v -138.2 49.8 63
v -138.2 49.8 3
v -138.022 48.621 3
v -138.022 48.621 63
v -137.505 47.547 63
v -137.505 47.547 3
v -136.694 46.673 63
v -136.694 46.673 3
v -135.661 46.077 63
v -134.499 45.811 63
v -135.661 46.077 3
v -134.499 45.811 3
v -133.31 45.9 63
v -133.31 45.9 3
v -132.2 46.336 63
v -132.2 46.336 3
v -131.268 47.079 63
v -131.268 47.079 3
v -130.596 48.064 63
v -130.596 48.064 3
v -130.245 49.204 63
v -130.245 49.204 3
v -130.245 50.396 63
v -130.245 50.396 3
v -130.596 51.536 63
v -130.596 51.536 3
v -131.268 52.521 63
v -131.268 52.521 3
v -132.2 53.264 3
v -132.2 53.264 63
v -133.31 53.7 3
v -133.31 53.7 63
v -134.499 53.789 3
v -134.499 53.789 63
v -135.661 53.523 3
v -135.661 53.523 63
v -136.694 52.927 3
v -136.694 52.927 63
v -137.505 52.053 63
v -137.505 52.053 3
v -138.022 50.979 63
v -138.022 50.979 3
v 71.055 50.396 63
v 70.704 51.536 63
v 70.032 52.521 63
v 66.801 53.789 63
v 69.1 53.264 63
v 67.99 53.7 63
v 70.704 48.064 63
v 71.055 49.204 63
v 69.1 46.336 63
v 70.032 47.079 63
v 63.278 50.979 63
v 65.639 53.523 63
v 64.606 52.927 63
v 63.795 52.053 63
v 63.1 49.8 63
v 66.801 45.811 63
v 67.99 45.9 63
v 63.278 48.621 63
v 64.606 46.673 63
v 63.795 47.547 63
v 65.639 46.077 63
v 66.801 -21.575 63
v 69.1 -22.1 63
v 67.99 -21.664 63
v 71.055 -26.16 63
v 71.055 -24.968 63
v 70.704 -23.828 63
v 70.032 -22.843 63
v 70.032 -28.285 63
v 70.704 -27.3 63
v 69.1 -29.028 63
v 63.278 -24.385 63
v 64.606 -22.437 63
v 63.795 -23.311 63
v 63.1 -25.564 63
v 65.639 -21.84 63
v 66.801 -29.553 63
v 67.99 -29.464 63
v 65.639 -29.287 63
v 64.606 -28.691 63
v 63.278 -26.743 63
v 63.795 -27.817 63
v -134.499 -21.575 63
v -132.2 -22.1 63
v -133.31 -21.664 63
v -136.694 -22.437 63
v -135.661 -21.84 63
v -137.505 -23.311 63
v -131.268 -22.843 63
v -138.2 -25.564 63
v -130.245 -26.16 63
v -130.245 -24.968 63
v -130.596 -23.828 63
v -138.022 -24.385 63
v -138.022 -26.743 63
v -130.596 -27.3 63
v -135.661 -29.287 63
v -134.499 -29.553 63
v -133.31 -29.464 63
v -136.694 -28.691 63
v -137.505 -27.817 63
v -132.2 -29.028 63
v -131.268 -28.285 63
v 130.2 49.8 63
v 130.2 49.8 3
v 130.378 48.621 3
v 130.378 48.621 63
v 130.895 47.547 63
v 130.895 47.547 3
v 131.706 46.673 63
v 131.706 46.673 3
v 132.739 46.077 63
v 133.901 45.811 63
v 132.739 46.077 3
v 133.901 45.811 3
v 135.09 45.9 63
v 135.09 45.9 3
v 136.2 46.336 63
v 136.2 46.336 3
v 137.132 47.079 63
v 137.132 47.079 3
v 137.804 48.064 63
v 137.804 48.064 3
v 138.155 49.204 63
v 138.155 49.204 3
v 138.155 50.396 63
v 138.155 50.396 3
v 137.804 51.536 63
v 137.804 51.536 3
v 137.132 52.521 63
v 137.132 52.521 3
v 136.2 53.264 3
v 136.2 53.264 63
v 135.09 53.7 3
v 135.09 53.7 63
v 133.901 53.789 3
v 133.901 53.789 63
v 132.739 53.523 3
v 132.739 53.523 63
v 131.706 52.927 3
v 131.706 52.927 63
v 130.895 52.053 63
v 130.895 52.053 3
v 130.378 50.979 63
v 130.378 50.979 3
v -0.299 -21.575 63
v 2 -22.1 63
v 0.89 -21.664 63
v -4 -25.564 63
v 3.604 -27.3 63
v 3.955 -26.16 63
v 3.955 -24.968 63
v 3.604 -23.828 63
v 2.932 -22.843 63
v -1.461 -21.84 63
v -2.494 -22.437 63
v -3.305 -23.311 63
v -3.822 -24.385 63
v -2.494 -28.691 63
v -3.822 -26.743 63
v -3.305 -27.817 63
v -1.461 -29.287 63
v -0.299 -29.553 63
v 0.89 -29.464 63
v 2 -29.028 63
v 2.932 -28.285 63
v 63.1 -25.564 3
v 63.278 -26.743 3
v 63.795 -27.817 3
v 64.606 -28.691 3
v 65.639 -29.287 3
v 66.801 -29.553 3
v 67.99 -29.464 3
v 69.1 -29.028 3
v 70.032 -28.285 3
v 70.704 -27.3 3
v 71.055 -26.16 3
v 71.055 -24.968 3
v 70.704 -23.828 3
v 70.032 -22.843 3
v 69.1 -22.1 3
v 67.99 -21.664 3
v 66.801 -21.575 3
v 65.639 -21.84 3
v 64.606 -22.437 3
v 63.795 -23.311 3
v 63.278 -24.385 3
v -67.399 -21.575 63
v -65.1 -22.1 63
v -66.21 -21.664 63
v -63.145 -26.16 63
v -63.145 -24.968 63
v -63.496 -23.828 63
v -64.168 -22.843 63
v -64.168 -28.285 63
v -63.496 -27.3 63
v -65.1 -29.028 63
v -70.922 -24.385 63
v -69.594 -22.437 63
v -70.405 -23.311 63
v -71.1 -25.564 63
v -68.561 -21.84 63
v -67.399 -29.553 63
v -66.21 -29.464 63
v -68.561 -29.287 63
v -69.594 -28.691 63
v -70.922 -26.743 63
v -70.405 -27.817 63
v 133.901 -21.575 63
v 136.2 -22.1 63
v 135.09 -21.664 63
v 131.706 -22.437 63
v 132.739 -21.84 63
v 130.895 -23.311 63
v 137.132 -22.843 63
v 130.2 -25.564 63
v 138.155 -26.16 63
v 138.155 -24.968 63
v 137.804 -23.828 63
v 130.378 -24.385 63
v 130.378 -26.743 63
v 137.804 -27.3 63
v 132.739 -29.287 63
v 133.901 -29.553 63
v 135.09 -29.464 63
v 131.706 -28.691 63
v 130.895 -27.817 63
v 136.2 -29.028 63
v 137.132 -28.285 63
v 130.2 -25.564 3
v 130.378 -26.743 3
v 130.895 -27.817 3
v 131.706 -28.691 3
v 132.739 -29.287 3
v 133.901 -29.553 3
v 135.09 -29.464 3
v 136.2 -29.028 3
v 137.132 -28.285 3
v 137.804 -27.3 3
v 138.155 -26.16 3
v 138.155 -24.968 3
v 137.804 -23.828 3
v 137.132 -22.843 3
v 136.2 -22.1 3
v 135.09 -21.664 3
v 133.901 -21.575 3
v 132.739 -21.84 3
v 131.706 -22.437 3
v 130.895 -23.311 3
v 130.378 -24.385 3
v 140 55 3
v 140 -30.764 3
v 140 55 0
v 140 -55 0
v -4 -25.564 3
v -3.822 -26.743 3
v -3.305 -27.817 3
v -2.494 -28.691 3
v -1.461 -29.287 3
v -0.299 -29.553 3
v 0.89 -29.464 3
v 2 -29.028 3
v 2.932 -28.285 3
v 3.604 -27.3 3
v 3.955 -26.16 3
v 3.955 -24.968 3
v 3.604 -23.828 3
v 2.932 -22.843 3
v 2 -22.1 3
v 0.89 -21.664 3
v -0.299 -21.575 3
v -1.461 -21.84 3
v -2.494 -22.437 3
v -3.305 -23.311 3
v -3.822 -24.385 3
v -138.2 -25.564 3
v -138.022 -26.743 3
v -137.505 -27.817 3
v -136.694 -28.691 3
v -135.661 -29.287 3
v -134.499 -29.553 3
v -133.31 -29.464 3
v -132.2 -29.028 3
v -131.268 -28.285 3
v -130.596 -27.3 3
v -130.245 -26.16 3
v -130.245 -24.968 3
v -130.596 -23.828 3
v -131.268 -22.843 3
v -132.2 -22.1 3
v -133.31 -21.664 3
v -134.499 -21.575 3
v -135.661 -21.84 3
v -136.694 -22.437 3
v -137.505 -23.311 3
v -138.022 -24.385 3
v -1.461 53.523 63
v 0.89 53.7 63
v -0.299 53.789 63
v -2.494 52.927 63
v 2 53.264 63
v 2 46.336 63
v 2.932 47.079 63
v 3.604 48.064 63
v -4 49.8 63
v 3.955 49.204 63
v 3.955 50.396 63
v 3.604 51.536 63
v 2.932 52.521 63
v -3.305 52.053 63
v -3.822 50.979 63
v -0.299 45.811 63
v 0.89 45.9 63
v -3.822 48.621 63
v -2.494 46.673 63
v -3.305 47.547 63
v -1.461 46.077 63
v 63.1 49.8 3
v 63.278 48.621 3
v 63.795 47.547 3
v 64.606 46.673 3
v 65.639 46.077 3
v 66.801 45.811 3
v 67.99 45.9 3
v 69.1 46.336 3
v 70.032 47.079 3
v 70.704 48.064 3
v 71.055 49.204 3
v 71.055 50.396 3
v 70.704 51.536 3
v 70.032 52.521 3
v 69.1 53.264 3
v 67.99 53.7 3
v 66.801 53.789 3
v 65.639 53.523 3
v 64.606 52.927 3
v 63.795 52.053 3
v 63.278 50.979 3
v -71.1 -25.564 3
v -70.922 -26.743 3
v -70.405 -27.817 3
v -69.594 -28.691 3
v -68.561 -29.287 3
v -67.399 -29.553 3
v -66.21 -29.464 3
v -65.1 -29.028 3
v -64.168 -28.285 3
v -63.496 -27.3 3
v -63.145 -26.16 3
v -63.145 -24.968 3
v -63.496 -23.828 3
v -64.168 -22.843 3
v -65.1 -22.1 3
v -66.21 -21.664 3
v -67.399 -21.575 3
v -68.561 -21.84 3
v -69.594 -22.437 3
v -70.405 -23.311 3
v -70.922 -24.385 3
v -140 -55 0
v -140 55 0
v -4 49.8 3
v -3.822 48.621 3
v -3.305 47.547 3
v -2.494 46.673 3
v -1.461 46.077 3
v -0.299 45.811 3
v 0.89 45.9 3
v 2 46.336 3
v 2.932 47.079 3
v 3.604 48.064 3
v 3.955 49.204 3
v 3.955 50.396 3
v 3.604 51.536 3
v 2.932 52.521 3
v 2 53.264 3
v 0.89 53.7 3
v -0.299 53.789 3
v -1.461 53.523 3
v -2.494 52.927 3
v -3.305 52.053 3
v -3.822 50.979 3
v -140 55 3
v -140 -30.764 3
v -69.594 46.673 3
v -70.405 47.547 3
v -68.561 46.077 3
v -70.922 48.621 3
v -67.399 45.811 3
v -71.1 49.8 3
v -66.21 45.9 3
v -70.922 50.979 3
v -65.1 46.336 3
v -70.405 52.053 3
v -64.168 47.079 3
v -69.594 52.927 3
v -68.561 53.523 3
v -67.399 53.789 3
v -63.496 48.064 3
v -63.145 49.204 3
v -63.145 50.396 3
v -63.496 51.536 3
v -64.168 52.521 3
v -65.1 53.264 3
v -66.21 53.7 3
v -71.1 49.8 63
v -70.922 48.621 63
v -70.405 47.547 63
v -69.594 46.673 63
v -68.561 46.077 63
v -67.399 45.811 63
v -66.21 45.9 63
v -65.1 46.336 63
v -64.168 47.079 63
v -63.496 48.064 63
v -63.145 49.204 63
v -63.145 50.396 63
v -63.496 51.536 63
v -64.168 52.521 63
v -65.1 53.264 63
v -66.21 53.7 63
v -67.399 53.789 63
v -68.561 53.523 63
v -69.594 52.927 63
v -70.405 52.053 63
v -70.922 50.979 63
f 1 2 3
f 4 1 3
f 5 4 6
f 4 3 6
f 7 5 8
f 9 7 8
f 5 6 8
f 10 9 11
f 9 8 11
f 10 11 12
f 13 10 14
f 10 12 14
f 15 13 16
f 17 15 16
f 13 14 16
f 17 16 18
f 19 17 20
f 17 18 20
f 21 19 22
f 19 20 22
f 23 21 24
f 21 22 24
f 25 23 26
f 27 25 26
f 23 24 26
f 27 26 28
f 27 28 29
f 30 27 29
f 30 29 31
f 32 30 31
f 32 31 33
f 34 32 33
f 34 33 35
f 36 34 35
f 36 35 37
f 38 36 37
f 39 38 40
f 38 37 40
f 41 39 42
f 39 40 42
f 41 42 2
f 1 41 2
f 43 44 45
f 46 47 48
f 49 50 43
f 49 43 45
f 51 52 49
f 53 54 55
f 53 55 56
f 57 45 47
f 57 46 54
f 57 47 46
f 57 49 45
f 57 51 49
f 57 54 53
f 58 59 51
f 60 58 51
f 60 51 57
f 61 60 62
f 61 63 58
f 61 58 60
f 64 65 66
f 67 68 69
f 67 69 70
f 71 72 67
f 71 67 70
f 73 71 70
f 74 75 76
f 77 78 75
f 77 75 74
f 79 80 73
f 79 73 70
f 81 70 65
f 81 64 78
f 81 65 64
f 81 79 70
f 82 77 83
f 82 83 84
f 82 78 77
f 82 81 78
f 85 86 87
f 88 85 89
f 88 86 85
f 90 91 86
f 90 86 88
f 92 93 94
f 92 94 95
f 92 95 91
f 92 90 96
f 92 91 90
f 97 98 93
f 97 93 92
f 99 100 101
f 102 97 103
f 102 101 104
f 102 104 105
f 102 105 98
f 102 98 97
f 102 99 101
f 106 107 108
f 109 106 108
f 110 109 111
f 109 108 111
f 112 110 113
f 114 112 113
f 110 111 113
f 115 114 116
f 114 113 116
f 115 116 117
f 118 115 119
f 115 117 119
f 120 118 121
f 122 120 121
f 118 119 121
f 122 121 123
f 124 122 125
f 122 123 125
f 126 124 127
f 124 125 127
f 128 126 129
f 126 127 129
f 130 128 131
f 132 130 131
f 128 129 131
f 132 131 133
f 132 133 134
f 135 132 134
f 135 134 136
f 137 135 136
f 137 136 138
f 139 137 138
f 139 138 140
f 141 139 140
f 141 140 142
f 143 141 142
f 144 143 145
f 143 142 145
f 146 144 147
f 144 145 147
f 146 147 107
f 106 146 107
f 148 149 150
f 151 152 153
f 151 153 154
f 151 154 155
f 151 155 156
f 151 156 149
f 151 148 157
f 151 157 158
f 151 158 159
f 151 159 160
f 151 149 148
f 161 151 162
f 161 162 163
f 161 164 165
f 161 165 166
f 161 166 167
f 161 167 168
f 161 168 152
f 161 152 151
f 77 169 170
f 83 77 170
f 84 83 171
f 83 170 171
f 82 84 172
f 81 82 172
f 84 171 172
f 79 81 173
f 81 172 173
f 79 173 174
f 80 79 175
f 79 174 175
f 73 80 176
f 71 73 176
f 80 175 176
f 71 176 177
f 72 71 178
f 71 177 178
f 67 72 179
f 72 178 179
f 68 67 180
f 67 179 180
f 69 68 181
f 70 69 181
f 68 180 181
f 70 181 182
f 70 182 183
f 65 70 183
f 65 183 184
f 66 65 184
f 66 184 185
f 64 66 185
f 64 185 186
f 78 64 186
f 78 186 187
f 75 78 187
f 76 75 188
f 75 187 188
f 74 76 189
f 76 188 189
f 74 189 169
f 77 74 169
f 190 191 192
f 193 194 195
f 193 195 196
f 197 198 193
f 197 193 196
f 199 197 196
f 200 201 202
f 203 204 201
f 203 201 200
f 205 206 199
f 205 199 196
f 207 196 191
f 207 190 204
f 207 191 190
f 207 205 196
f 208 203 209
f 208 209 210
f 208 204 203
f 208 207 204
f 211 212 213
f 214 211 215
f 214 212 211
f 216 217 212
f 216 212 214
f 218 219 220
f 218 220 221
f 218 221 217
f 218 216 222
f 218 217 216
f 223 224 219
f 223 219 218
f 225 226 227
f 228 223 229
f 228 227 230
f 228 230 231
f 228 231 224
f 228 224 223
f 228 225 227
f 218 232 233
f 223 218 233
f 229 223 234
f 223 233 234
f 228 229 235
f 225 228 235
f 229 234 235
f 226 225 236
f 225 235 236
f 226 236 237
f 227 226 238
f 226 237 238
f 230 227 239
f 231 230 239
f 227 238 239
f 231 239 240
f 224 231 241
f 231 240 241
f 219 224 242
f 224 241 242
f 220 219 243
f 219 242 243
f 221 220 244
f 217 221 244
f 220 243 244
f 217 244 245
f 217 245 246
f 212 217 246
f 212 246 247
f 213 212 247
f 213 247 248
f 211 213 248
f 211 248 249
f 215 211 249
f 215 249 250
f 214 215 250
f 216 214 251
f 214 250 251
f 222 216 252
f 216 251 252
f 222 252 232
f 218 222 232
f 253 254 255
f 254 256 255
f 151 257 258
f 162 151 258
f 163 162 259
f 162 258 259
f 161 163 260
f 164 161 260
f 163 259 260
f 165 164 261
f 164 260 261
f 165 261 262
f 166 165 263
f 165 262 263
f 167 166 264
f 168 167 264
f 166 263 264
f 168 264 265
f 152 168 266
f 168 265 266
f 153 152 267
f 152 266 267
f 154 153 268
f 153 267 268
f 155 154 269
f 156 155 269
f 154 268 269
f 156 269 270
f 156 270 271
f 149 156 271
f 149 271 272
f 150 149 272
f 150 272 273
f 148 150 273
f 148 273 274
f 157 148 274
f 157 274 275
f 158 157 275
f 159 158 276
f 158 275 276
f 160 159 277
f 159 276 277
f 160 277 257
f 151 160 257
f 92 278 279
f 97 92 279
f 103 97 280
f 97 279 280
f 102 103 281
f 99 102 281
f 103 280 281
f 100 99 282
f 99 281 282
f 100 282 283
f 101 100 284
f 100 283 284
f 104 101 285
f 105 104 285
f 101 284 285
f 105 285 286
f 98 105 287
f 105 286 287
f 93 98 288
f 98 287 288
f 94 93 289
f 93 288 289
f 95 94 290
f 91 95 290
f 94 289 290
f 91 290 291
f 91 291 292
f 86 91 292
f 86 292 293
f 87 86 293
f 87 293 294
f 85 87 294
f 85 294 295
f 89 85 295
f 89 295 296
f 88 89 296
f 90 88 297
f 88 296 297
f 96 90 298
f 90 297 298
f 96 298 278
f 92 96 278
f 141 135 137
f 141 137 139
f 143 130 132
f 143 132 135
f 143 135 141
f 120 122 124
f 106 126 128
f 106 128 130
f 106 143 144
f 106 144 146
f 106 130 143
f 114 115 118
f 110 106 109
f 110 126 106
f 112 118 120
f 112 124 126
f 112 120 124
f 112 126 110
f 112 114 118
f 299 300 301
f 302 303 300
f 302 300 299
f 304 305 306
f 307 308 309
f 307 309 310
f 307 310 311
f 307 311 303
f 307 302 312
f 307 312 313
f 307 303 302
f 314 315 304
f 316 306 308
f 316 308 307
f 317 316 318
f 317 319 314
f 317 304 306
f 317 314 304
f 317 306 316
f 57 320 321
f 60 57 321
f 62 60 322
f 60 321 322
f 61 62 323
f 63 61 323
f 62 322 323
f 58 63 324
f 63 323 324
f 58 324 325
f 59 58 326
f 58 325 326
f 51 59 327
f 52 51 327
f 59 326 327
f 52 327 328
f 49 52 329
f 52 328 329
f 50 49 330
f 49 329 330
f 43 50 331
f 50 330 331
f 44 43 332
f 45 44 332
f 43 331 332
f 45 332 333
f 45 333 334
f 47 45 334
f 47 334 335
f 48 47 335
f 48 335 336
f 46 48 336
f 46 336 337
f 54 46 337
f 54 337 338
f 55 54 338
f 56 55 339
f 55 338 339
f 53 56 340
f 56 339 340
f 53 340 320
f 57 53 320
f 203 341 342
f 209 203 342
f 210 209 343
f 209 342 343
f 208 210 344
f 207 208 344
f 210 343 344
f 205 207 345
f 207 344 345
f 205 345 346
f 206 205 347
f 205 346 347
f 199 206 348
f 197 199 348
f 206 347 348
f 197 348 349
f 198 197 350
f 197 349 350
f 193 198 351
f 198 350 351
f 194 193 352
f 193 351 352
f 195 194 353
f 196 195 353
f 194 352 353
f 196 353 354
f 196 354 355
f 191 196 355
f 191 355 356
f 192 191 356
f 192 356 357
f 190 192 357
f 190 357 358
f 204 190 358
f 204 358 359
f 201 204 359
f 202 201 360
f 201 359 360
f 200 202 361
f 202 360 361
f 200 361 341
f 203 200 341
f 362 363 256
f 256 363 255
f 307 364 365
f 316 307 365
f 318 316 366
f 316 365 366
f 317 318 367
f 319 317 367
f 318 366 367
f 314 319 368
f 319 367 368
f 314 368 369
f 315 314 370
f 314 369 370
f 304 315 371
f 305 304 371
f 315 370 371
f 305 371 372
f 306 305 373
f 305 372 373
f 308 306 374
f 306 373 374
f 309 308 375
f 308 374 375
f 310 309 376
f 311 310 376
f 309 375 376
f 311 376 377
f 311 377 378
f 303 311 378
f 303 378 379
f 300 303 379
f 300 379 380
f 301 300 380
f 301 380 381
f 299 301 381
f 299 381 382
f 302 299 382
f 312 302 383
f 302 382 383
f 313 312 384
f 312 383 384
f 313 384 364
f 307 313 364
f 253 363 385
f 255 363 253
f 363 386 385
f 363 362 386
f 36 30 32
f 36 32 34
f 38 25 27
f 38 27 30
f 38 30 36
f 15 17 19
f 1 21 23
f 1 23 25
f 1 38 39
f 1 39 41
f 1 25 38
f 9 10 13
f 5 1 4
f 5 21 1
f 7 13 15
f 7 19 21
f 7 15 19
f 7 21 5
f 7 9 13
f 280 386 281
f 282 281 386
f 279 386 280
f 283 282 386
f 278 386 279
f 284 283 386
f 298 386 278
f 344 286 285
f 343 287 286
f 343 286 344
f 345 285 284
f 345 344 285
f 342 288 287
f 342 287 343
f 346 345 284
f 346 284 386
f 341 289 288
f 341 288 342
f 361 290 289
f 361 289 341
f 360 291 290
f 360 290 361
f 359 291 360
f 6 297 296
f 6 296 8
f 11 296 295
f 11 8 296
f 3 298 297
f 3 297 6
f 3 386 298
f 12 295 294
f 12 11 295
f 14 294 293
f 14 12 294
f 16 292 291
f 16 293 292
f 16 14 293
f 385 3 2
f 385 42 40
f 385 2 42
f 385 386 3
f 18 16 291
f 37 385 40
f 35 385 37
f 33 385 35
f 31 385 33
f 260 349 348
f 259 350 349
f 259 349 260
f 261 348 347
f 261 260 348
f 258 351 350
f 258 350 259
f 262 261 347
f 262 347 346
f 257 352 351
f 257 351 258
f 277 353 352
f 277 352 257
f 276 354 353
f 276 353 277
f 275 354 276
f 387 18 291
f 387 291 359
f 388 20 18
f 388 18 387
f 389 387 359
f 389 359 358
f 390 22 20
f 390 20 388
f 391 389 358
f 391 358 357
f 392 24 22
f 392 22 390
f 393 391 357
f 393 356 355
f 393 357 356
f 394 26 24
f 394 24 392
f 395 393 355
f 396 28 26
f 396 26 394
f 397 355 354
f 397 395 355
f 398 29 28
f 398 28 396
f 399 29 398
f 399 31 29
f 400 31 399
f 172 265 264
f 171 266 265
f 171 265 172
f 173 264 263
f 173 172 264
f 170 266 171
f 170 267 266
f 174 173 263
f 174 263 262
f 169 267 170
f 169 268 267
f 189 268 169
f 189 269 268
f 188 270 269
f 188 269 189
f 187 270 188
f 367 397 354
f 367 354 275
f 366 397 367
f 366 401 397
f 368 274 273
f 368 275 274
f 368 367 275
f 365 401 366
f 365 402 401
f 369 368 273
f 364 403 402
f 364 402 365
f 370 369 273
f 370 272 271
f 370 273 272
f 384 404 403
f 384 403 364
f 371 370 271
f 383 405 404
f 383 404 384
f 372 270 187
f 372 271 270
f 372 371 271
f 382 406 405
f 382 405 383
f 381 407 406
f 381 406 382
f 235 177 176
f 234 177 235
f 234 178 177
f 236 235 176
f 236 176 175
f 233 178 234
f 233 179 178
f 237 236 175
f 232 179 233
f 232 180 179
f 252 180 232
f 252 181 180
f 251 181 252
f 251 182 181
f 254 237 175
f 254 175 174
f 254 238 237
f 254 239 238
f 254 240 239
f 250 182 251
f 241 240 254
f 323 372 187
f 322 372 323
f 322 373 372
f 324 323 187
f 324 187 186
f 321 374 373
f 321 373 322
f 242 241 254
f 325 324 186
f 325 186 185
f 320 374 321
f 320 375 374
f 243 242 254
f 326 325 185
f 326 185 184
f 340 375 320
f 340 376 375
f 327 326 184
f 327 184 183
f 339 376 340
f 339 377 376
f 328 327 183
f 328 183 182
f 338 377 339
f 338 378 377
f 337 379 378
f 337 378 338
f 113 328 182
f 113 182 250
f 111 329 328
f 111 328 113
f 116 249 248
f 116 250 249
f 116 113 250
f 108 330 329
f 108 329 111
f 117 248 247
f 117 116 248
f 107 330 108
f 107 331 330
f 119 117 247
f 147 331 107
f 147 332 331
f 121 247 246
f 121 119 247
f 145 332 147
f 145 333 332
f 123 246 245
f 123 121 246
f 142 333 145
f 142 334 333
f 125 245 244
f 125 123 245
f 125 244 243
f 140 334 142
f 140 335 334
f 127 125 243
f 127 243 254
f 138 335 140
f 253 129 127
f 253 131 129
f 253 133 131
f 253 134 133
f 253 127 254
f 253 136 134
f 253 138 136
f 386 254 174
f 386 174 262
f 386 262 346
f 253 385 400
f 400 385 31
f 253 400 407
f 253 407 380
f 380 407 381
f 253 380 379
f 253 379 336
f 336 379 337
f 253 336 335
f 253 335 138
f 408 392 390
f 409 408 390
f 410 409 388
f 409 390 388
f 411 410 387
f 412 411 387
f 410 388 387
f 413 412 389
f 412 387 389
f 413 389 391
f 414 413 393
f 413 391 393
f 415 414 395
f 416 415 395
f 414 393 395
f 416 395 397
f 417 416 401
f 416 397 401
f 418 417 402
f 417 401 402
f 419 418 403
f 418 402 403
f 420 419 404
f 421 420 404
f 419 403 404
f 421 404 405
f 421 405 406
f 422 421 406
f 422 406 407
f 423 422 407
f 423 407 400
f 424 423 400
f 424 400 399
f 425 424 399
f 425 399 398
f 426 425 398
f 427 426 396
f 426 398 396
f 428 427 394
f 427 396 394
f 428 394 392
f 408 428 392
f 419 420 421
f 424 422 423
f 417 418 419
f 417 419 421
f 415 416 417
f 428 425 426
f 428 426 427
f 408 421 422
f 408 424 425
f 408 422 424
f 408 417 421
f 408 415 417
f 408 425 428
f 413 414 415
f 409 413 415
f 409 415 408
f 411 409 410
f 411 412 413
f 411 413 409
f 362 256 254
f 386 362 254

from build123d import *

# Parameters (mm, degrees)
ESBO_O1_W                = 280
ESBO_O1_H                = 110
RESSALTO_EXTRUS_O1_DEPTH = 3
CORTE_EXTRUS_O1_DEPTH    = 280
ESBO_O4_R                = 4
RESSALTO_EXTRUS_O2_DEPTH = 60


with BuildPart() as part:
    # Esboço1 → Ressalto-extrusão1 (new body)
    with BuildSketch(Plane.XY):
        Rectangle(ESBO_O1_W, ESBO_O1_H)
    extrude(amount=RESSALTO_EXTRUS_O1_DEPTH)

    # Esboço3 → Corte-extrusão1 (cut)
    with BuildSketch(Plane.ZY.offset(140)):
        Polygon((0, -55), (3.02401214, -30.57), (3, -55), align=None)
    extrude(amount=-CORTE_EXTRUS_O1_DEPTH, mode=Mode.SUBTRACT)

    # Esboço4 → Ressalto-extrusão2 (add)
    with BuildSketch(Plane.XY.offset(3)):
        with Locations(Location((134.2, 49.8, 0), (0, 0, 180))):
            Circle(ESBO_O4_R)
        with Locations(Location((67.1, 49.8, 0), (0, 0, 180))):
            Circle(ESBO_O4_R)
        with Locations(Location((0, 49.8, 0), (0, 0, 180))):
            Circle(ESBO_O4_R)
        with Locations(Location((-67.1, 49.8, 0), (0, 0, 180))):
            Circle(ESBO_O4_R)
        with Locations(Location((-134.2, 49.8, 0), (0, 0, 180))):
            Circle(ESBO_O4_R)
        with Locations(Location((-134.2, -25.563986188, 0), (0, 0, 180))):
            Circle(ESBO_O4_R)
        with Locations(Location((-67.1, -25.563986188, 0), (0, 0, 180))):
            Circle(ESBO_O4_R)
        with Locations(Location((0, -25.563986188, 0), (0, 0, 180))):
            Circle(ESBO_O4_R)
        with Locations(Location((67.1, -25.563986188, 0), (0, 0, 180))):
            Circle(ESBO_O4_R)
        with Locations(Location((134.2, -25.563986188, 0), (0, 0, 180))):
            Circle(ESBO_O4_R)
    extrude(amount=RESSALTO_EXTRUS_O2_DEPTH)


solid = part.part
